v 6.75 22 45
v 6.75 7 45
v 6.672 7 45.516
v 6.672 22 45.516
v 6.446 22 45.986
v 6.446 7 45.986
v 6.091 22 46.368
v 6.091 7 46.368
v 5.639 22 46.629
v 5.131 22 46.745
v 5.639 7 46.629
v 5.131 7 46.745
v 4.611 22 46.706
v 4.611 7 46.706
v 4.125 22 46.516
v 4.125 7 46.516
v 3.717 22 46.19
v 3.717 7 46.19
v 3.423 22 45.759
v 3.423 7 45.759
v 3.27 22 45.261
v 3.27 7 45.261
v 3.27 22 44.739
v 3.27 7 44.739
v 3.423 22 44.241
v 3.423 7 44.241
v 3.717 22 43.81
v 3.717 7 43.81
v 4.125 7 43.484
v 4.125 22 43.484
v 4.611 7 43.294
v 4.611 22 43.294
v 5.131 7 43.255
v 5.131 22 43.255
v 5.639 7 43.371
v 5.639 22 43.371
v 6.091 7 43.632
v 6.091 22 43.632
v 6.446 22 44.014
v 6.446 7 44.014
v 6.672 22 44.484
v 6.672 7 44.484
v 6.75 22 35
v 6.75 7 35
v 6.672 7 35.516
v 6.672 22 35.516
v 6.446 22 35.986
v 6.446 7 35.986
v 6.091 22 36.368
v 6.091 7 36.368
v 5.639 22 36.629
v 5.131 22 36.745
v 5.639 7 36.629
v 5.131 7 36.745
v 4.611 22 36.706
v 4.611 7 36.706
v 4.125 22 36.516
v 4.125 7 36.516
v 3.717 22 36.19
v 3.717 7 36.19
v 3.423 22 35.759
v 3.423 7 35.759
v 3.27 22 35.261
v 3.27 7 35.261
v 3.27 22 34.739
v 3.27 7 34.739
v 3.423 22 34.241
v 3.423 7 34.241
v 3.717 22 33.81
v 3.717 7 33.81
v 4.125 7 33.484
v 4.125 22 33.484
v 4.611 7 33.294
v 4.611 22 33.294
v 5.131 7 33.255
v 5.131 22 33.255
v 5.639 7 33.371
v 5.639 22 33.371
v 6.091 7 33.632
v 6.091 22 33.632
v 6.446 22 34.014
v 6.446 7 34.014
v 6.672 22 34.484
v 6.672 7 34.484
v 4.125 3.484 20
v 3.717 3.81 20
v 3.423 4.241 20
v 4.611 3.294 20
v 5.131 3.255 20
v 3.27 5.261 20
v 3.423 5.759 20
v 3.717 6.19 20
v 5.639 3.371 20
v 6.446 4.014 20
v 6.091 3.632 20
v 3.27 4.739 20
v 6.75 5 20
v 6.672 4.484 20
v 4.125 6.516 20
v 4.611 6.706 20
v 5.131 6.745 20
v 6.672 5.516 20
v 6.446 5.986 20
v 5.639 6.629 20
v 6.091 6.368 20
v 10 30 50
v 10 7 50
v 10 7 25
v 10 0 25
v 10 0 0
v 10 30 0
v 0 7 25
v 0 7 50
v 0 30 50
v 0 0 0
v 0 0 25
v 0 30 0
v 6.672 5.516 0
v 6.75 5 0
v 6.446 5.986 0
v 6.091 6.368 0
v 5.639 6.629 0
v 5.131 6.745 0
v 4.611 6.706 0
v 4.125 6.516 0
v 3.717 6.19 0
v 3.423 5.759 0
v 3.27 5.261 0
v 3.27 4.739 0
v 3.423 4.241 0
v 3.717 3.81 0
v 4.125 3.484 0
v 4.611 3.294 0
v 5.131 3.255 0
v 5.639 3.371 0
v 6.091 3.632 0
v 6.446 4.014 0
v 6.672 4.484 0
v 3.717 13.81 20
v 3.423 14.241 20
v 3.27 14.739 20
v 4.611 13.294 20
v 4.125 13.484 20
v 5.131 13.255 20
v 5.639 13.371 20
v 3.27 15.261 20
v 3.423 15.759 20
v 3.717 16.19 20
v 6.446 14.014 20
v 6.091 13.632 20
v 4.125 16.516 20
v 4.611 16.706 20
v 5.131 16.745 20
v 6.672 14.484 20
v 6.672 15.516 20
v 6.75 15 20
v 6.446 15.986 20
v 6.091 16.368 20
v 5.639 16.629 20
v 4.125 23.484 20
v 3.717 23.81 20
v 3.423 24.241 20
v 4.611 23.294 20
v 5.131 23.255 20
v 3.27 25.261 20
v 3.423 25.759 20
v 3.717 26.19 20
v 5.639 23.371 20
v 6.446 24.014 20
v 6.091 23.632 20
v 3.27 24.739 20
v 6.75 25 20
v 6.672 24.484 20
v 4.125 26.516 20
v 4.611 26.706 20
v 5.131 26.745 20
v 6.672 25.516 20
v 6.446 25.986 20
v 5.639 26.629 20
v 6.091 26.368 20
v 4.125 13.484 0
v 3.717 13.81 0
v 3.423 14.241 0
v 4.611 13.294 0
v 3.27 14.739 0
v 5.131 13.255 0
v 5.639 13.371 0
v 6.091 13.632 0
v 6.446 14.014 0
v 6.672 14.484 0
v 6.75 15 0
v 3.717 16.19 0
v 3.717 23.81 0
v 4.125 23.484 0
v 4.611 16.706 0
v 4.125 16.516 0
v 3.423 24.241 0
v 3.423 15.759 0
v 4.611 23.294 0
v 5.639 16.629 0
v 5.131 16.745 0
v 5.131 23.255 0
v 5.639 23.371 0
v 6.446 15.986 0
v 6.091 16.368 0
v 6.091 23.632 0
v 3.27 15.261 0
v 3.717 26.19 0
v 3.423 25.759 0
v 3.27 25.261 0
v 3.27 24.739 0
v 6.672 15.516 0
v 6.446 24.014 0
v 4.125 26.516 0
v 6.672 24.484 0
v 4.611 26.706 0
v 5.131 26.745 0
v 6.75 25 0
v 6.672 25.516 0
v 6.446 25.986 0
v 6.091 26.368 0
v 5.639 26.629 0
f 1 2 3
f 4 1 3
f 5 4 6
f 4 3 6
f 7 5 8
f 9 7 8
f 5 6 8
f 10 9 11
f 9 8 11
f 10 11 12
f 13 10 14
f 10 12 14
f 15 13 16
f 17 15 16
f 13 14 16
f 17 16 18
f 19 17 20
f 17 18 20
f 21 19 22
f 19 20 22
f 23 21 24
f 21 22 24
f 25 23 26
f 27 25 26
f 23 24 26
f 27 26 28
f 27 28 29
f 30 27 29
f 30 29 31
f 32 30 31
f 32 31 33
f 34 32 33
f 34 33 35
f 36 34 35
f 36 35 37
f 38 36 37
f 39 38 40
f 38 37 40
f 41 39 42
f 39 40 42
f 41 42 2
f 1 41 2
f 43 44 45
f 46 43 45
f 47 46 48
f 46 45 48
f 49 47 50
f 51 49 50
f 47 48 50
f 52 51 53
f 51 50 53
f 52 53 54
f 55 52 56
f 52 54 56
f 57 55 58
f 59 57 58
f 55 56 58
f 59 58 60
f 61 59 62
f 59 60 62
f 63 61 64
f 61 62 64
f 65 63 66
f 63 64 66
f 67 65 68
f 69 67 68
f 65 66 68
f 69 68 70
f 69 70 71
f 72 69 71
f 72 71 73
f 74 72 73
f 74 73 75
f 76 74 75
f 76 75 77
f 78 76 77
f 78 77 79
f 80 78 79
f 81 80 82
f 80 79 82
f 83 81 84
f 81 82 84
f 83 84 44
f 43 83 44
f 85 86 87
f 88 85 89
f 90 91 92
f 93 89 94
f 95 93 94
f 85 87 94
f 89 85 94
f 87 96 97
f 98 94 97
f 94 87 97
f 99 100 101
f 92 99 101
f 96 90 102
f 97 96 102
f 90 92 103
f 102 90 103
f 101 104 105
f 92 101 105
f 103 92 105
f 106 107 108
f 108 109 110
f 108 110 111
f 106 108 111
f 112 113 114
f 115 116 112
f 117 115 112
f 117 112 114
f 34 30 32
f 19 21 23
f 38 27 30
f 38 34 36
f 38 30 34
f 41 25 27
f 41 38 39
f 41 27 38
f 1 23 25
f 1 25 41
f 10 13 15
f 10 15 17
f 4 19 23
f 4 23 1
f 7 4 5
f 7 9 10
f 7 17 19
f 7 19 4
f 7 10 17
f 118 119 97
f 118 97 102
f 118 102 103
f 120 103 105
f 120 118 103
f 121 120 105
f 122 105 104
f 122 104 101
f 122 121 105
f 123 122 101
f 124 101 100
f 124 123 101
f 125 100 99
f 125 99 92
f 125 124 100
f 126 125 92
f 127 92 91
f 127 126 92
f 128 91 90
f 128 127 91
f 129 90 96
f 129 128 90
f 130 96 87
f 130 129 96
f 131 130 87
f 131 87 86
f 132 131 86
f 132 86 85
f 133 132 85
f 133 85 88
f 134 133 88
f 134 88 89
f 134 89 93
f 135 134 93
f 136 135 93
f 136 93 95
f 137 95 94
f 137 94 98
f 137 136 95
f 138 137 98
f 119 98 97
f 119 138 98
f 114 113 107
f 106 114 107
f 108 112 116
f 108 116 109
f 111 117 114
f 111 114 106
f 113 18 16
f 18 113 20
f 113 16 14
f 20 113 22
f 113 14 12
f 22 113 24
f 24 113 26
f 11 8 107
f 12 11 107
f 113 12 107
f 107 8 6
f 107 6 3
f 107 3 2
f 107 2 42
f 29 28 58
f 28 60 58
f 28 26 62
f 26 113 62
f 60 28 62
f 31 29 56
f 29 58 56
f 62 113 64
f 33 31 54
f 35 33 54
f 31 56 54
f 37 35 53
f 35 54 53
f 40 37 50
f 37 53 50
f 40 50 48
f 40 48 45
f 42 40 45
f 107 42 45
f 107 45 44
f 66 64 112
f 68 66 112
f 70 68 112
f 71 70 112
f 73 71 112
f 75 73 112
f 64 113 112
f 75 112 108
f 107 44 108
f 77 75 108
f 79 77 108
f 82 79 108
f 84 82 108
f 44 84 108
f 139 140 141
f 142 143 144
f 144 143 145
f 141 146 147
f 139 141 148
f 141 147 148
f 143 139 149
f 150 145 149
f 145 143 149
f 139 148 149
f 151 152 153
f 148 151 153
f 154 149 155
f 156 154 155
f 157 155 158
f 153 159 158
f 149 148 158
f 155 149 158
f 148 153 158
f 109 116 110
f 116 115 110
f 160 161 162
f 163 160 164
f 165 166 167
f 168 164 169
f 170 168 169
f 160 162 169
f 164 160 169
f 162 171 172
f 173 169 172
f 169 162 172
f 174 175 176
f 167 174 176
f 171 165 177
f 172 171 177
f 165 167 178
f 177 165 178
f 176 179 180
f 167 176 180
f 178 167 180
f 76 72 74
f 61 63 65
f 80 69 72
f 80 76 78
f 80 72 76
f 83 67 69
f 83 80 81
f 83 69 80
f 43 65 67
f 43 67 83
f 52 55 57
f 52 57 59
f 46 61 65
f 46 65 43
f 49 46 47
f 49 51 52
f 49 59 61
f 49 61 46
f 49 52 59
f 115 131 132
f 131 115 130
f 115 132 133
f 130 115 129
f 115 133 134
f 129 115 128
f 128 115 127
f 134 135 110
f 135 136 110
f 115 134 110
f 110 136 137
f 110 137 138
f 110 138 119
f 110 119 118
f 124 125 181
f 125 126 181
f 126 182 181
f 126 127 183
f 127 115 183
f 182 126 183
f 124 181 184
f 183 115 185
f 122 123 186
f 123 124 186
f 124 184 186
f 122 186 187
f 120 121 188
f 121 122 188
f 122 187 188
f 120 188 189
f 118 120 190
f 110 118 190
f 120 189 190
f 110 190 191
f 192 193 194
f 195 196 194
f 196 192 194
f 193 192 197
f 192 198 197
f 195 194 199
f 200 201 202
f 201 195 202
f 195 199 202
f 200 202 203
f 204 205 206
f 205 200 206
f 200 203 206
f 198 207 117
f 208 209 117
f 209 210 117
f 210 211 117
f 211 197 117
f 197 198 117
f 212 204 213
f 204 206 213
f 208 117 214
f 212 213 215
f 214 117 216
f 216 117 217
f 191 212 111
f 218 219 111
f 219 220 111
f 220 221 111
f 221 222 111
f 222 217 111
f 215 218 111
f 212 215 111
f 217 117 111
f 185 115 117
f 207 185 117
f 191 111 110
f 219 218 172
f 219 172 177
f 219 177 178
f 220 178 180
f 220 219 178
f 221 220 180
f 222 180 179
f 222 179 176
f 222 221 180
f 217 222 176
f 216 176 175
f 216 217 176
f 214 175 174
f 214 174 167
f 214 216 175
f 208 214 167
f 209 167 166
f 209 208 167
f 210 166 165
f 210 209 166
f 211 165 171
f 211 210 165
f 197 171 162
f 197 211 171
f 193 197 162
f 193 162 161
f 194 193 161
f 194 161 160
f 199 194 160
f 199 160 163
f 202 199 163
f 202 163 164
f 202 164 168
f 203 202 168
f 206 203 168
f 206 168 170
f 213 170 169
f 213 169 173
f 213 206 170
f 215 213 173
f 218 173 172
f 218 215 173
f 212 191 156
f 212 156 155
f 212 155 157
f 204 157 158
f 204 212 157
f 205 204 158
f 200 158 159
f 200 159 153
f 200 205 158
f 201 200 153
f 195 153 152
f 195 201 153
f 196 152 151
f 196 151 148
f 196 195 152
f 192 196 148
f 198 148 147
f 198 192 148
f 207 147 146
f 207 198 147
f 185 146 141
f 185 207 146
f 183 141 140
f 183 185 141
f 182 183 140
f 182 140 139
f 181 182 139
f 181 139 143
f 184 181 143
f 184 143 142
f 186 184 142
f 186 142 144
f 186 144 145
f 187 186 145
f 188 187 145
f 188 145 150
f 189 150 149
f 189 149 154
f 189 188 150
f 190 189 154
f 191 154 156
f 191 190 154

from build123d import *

# Parameters (mm, degrees)
ESQUISSE1_W             = 10
ESQUISSE1_H             = 30
ESQUISSE1_R             = 1.75
BOSS_EXTRU_1_DEPTH      = 20
ESQUISSE2_W             = 10
ESQUISSE2_H             = 30
BOSS_EXTRU_2_DEPTH      = 5
ESQUISSE3_W             = 10
ESQUISSE3_H             = 23
BOSS_EXTRU_3_DEPTH      = 25
ESQUISSE4_R             = 1.75
ENL_V_MAT_EXTRU_1_DEPTH = 15


with BuildPart() as part:
    # Esquisse1 → Boss.-Extru.1 (new body)
    with BuildSketch(Plane.XY):
        with Locations((5, 15)):
            Rectangle(ESQUISSE1_W, ESQUISSE1_H)
        with Locations((5, 5)):
            Circle(ESQUISSE1_R, mode=Mode.SUBTRACT)
        with Locations((5, 15)):
            Circle(ESQUISSE1_R, mode=Mode.SUBTRACT)
        with Locations((5, 25)):
            Circle(ESQUISSE1_R, mode=Mode.SUBTRACT)
    extrude(amount=BOSS_EXTRU_1_DEPTH)

    # Esquisse2 → Boss.-Extru.2 (add)
    with BuildSketch(Plane.XY.offset(20)):
        with Locations((5, 15)):
            Rectangle(ESQUISSE2_W, ESQUISSE2_H)
    extrude(amount=BOSS_EXTRU_2_DEPTH)

    # Esquisse3 → Boss.-Extru.3 (add)
    with BuildSketch(Plane.XY.offset(25)):
        with Locations((5, 18.5)):
            Rectangle(ESQUISSE3_W, ESQUISSE3_H)
    extrude(amount=BOSS_EXTRU_3_DEPTH)

    # Esquisse4 → Enlèv. mat.-Extru.1 (cut)
    with BuildSketch(Plane(origin=(0, 7, 0), x_dir=(-1, 0, 0), z_dir=(0, -1, 0))):
        with Locations(Location((-5, -45, 0), (0, 0, 180))):
            Circle(ESQUISSE4_R)
        with Locations(Location((-5, -35, 0), (0, 0, 180))):
            Circle(ESQUISSE4_R)
    extrude(amount=-ENL_V_MAT_EXTRU_1_DEPTH, mode=Mode.SUBTRACT)


solid = part.part
